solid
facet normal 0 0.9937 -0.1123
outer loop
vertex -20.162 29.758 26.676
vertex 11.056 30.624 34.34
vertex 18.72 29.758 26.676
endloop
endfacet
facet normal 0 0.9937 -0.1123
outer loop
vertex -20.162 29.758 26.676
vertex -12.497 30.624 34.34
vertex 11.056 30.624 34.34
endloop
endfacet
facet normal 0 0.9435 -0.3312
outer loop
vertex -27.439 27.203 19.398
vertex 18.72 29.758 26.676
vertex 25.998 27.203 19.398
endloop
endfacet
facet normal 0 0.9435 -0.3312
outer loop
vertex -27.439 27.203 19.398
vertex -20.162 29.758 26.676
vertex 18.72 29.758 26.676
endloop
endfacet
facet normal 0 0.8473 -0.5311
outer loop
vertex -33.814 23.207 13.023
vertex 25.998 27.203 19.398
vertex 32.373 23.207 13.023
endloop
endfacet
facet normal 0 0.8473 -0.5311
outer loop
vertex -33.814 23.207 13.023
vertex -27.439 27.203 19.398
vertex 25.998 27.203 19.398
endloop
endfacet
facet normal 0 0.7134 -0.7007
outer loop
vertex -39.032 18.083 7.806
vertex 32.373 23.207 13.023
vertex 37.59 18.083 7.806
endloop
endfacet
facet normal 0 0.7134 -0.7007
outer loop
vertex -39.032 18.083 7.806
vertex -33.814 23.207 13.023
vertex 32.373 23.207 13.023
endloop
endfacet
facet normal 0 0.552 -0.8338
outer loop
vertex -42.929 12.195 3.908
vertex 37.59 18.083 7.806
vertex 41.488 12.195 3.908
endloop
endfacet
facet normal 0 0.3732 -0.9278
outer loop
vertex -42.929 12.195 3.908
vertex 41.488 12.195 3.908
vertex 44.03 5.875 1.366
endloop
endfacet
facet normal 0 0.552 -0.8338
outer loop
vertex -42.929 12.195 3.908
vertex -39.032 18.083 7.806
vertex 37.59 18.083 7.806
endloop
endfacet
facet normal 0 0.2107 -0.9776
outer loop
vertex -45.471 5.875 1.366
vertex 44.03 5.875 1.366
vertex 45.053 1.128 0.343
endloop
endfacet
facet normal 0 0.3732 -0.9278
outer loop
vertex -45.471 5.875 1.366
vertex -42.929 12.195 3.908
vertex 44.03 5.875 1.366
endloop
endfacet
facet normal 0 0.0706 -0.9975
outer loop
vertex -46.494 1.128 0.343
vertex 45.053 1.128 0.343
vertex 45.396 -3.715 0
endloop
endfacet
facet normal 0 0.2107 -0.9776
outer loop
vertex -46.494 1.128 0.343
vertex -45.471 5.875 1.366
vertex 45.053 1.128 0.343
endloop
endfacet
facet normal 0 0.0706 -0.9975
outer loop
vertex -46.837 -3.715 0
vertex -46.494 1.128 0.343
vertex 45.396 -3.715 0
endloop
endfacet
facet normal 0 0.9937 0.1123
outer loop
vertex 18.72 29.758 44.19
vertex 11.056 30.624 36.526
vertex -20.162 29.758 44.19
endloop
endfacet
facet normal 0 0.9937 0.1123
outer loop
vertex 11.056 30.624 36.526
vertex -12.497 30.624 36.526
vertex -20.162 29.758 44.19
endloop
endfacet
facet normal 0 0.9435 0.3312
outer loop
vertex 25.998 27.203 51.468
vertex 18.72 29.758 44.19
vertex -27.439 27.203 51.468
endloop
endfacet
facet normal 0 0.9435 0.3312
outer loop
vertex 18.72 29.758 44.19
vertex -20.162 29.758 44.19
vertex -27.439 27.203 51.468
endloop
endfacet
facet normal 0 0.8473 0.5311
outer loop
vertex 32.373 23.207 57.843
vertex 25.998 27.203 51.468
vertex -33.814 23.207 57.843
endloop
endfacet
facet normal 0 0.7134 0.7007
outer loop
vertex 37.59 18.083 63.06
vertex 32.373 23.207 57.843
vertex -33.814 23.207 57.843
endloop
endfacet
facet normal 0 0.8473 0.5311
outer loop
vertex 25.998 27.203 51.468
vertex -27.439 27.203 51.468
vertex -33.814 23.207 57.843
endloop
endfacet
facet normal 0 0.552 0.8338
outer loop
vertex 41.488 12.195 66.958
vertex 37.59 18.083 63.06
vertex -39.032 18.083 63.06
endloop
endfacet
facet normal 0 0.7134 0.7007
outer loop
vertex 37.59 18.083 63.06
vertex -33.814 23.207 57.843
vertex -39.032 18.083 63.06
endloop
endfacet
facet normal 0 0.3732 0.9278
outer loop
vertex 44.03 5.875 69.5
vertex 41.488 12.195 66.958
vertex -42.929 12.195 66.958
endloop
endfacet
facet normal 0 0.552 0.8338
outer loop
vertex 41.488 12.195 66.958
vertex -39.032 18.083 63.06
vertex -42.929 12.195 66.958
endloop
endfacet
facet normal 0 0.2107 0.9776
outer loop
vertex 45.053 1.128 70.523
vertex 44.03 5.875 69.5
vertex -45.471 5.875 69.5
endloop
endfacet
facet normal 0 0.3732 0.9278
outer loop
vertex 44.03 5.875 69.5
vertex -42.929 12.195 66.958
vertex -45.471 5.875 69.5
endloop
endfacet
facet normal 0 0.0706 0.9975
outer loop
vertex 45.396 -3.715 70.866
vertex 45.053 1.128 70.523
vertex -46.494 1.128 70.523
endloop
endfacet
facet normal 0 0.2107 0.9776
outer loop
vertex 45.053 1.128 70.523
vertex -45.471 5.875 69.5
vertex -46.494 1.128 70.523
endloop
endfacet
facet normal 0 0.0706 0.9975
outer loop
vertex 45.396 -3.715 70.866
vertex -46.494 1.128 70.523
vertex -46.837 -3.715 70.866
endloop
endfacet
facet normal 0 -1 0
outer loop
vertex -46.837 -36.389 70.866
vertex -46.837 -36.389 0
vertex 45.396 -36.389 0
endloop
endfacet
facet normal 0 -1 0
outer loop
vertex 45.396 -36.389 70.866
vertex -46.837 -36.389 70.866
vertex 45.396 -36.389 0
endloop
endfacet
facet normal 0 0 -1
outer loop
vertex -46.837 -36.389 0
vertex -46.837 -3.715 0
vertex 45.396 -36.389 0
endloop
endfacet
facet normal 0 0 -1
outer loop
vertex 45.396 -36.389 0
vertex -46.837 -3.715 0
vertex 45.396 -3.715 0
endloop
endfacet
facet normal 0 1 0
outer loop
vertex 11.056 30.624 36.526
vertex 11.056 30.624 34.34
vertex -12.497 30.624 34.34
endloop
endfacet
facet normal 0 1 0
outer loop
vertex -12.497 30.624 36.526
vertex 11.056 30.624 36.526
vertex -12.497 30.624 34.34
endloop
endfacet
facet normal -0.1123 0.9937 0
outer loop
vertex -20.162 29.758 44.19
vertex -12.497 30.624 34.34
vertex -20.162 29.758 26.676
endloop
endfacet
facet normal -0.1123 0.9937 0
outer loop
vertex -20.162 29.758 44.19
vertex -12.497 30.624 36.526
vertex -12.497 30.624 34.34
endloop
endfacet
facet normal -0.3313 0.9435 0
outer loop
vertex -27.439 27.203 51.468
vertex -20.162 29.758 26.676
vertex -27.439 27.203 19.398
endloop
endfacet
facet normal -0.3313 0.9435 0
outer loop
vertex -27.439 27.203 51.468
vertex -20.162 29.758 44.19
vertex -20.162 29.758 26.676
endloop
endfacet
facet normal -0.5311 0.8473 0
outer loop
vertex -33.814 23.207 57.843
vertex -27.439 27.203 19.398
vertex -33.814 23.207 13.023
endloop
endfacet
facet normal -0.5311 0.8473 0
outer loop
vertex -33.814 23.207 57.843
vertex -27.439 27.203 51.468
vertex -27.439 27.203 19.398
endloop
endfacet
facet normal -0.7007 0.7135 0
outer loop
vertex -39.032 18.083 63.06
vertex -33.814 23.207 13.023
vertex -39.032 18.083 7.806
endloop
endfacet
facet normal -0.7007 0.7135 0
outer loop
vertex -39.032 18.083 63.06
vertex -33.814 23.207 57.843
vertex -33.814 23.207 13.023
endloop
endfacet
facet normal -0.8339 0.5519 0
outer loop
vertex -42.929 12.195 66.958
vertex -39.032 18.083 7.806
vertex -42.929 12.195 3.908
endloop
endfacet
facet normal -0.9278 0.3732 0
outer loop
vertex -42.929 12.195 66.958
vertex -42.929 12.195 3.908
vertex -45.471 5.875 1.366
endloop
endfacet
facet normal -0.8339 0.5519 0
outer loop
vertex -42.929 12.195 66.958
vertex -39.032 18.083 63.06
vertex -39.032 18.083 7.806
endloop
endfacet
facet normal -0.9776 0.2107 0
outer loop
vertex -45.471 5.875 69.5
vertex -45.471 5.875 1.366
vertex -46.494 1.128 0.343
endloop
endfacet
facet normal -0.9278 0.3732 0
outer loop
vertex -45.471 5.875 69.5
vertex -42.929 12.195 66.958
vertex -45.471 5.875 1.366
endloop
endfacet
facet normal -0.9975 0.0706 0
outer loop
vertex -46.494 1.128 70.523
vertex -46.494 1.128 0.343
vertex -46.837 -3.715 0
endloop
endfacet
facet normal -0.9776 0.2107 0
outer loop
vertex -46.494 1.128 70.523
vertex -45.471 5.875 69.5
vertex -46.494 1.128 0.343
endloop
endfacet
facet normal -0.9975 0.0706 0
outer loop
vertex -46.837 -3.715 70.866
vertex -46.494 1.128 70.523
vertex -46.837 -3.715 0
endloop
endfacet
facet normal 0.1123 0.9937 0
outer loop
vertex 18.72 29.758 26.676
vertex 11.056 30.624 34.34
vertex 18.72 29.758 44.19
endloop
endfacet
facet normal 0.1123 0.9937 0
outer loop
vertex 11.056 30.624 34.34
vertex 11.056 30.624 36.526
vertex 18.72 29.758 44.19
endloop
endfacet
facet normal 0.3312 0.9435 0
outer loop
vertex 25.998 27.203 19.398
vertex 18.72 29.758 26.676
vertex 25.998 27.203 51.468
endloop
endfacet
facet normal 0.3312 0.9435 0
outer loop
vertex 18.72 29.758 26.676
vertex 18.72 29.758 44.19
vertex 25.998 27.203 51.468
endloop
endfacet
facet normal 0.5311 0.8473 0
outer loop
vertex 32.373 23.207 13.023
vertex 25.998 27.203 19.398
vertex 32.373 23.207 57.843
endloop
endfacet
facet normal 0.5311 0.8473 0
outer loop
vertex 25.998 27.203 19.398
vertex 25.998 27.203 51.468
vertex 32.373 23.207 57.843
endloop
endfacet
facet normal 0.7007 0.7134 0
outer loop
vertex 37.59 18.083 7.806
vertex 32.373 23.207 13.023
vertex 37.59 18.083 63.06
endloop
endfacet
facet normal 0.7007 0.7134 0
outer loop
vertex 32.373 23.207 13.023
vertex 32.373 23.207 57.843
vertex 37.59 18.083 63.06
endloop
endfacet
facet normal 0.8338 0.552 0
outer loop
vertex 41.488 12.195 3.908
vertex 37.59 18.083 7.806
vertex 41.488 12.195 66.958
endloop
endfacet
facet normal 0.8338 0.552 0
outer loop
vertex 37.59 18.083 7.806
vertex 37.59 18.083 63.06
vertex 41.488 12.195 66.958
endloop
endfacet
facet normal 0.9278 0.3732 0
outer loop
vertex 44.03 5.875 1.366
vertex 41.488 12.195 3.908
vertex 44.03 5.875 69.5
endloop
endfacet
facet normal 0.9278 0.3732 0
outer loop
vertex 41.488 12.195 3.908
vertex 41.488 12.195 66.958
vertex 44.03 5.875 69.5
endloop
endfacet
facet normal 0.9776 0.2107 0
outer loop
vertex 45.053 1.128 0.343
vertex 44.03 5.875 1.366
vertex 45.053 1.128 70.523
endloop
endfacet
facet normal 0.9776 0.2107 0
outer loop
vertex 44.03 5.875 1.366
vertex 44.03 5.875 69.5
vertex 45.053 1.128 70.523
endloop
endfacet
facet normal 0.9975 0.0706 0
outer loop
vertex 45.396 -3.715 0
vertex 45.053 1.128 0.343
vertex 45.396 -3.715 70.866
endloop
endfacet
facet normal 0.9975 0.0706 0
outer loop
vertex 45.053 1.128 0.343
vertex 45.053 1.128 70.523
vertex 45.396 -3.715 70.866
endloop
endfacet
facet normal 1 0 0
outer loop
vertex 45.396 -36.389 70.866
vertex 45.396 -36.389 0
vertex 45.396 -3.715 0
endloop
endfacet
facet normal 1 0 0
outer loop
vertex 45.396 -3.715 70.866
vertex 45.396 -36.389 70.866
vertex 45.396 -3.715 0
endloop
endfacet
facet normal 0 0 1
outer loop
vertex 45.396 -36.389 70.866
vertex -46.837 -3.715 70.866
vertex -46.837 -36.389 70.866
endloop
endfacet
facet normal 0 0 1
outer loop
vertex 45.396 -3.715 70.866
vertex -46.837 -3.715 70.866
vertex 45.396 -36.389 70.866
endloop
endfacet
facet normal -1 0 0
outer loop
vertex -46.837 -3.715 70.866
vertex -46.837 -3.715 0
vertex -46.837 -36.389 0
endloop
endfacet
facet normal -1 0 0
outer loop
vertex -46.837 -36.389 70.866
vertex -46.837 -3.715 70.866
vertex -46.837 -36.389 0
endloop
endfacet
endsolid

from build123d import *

# Parameters (mm, degrees)
F1_DEPTH = 70.866
F2_R     = 34.339774


with BuildPart() as f1:
    # F0 (on Top) → F1 (new body)
    with BuildSketch(Plane.XY):
        Polygon((45.39609, 30.624349), (-46.83724, 30.624349), (-46.83724, 28.46263), (-46.83724, -36.38893), (45.39609, -36.38893), align=None)
    extrude(amount=F1_DEPTH)

    # F2
    f2_edges = [f1.edges().sort_by_distance(p)[0] for p in [
        (45.39609, 30.624349, 35.433),
        (-46.83724, 30.624349, 35.433),
        (-0.720575, 30.624349, 0),
        (-0.720575, 30.624349, 70.866),
    ]]
    fillet(f2_edges, radius=F2_R)


solid = f1.part
